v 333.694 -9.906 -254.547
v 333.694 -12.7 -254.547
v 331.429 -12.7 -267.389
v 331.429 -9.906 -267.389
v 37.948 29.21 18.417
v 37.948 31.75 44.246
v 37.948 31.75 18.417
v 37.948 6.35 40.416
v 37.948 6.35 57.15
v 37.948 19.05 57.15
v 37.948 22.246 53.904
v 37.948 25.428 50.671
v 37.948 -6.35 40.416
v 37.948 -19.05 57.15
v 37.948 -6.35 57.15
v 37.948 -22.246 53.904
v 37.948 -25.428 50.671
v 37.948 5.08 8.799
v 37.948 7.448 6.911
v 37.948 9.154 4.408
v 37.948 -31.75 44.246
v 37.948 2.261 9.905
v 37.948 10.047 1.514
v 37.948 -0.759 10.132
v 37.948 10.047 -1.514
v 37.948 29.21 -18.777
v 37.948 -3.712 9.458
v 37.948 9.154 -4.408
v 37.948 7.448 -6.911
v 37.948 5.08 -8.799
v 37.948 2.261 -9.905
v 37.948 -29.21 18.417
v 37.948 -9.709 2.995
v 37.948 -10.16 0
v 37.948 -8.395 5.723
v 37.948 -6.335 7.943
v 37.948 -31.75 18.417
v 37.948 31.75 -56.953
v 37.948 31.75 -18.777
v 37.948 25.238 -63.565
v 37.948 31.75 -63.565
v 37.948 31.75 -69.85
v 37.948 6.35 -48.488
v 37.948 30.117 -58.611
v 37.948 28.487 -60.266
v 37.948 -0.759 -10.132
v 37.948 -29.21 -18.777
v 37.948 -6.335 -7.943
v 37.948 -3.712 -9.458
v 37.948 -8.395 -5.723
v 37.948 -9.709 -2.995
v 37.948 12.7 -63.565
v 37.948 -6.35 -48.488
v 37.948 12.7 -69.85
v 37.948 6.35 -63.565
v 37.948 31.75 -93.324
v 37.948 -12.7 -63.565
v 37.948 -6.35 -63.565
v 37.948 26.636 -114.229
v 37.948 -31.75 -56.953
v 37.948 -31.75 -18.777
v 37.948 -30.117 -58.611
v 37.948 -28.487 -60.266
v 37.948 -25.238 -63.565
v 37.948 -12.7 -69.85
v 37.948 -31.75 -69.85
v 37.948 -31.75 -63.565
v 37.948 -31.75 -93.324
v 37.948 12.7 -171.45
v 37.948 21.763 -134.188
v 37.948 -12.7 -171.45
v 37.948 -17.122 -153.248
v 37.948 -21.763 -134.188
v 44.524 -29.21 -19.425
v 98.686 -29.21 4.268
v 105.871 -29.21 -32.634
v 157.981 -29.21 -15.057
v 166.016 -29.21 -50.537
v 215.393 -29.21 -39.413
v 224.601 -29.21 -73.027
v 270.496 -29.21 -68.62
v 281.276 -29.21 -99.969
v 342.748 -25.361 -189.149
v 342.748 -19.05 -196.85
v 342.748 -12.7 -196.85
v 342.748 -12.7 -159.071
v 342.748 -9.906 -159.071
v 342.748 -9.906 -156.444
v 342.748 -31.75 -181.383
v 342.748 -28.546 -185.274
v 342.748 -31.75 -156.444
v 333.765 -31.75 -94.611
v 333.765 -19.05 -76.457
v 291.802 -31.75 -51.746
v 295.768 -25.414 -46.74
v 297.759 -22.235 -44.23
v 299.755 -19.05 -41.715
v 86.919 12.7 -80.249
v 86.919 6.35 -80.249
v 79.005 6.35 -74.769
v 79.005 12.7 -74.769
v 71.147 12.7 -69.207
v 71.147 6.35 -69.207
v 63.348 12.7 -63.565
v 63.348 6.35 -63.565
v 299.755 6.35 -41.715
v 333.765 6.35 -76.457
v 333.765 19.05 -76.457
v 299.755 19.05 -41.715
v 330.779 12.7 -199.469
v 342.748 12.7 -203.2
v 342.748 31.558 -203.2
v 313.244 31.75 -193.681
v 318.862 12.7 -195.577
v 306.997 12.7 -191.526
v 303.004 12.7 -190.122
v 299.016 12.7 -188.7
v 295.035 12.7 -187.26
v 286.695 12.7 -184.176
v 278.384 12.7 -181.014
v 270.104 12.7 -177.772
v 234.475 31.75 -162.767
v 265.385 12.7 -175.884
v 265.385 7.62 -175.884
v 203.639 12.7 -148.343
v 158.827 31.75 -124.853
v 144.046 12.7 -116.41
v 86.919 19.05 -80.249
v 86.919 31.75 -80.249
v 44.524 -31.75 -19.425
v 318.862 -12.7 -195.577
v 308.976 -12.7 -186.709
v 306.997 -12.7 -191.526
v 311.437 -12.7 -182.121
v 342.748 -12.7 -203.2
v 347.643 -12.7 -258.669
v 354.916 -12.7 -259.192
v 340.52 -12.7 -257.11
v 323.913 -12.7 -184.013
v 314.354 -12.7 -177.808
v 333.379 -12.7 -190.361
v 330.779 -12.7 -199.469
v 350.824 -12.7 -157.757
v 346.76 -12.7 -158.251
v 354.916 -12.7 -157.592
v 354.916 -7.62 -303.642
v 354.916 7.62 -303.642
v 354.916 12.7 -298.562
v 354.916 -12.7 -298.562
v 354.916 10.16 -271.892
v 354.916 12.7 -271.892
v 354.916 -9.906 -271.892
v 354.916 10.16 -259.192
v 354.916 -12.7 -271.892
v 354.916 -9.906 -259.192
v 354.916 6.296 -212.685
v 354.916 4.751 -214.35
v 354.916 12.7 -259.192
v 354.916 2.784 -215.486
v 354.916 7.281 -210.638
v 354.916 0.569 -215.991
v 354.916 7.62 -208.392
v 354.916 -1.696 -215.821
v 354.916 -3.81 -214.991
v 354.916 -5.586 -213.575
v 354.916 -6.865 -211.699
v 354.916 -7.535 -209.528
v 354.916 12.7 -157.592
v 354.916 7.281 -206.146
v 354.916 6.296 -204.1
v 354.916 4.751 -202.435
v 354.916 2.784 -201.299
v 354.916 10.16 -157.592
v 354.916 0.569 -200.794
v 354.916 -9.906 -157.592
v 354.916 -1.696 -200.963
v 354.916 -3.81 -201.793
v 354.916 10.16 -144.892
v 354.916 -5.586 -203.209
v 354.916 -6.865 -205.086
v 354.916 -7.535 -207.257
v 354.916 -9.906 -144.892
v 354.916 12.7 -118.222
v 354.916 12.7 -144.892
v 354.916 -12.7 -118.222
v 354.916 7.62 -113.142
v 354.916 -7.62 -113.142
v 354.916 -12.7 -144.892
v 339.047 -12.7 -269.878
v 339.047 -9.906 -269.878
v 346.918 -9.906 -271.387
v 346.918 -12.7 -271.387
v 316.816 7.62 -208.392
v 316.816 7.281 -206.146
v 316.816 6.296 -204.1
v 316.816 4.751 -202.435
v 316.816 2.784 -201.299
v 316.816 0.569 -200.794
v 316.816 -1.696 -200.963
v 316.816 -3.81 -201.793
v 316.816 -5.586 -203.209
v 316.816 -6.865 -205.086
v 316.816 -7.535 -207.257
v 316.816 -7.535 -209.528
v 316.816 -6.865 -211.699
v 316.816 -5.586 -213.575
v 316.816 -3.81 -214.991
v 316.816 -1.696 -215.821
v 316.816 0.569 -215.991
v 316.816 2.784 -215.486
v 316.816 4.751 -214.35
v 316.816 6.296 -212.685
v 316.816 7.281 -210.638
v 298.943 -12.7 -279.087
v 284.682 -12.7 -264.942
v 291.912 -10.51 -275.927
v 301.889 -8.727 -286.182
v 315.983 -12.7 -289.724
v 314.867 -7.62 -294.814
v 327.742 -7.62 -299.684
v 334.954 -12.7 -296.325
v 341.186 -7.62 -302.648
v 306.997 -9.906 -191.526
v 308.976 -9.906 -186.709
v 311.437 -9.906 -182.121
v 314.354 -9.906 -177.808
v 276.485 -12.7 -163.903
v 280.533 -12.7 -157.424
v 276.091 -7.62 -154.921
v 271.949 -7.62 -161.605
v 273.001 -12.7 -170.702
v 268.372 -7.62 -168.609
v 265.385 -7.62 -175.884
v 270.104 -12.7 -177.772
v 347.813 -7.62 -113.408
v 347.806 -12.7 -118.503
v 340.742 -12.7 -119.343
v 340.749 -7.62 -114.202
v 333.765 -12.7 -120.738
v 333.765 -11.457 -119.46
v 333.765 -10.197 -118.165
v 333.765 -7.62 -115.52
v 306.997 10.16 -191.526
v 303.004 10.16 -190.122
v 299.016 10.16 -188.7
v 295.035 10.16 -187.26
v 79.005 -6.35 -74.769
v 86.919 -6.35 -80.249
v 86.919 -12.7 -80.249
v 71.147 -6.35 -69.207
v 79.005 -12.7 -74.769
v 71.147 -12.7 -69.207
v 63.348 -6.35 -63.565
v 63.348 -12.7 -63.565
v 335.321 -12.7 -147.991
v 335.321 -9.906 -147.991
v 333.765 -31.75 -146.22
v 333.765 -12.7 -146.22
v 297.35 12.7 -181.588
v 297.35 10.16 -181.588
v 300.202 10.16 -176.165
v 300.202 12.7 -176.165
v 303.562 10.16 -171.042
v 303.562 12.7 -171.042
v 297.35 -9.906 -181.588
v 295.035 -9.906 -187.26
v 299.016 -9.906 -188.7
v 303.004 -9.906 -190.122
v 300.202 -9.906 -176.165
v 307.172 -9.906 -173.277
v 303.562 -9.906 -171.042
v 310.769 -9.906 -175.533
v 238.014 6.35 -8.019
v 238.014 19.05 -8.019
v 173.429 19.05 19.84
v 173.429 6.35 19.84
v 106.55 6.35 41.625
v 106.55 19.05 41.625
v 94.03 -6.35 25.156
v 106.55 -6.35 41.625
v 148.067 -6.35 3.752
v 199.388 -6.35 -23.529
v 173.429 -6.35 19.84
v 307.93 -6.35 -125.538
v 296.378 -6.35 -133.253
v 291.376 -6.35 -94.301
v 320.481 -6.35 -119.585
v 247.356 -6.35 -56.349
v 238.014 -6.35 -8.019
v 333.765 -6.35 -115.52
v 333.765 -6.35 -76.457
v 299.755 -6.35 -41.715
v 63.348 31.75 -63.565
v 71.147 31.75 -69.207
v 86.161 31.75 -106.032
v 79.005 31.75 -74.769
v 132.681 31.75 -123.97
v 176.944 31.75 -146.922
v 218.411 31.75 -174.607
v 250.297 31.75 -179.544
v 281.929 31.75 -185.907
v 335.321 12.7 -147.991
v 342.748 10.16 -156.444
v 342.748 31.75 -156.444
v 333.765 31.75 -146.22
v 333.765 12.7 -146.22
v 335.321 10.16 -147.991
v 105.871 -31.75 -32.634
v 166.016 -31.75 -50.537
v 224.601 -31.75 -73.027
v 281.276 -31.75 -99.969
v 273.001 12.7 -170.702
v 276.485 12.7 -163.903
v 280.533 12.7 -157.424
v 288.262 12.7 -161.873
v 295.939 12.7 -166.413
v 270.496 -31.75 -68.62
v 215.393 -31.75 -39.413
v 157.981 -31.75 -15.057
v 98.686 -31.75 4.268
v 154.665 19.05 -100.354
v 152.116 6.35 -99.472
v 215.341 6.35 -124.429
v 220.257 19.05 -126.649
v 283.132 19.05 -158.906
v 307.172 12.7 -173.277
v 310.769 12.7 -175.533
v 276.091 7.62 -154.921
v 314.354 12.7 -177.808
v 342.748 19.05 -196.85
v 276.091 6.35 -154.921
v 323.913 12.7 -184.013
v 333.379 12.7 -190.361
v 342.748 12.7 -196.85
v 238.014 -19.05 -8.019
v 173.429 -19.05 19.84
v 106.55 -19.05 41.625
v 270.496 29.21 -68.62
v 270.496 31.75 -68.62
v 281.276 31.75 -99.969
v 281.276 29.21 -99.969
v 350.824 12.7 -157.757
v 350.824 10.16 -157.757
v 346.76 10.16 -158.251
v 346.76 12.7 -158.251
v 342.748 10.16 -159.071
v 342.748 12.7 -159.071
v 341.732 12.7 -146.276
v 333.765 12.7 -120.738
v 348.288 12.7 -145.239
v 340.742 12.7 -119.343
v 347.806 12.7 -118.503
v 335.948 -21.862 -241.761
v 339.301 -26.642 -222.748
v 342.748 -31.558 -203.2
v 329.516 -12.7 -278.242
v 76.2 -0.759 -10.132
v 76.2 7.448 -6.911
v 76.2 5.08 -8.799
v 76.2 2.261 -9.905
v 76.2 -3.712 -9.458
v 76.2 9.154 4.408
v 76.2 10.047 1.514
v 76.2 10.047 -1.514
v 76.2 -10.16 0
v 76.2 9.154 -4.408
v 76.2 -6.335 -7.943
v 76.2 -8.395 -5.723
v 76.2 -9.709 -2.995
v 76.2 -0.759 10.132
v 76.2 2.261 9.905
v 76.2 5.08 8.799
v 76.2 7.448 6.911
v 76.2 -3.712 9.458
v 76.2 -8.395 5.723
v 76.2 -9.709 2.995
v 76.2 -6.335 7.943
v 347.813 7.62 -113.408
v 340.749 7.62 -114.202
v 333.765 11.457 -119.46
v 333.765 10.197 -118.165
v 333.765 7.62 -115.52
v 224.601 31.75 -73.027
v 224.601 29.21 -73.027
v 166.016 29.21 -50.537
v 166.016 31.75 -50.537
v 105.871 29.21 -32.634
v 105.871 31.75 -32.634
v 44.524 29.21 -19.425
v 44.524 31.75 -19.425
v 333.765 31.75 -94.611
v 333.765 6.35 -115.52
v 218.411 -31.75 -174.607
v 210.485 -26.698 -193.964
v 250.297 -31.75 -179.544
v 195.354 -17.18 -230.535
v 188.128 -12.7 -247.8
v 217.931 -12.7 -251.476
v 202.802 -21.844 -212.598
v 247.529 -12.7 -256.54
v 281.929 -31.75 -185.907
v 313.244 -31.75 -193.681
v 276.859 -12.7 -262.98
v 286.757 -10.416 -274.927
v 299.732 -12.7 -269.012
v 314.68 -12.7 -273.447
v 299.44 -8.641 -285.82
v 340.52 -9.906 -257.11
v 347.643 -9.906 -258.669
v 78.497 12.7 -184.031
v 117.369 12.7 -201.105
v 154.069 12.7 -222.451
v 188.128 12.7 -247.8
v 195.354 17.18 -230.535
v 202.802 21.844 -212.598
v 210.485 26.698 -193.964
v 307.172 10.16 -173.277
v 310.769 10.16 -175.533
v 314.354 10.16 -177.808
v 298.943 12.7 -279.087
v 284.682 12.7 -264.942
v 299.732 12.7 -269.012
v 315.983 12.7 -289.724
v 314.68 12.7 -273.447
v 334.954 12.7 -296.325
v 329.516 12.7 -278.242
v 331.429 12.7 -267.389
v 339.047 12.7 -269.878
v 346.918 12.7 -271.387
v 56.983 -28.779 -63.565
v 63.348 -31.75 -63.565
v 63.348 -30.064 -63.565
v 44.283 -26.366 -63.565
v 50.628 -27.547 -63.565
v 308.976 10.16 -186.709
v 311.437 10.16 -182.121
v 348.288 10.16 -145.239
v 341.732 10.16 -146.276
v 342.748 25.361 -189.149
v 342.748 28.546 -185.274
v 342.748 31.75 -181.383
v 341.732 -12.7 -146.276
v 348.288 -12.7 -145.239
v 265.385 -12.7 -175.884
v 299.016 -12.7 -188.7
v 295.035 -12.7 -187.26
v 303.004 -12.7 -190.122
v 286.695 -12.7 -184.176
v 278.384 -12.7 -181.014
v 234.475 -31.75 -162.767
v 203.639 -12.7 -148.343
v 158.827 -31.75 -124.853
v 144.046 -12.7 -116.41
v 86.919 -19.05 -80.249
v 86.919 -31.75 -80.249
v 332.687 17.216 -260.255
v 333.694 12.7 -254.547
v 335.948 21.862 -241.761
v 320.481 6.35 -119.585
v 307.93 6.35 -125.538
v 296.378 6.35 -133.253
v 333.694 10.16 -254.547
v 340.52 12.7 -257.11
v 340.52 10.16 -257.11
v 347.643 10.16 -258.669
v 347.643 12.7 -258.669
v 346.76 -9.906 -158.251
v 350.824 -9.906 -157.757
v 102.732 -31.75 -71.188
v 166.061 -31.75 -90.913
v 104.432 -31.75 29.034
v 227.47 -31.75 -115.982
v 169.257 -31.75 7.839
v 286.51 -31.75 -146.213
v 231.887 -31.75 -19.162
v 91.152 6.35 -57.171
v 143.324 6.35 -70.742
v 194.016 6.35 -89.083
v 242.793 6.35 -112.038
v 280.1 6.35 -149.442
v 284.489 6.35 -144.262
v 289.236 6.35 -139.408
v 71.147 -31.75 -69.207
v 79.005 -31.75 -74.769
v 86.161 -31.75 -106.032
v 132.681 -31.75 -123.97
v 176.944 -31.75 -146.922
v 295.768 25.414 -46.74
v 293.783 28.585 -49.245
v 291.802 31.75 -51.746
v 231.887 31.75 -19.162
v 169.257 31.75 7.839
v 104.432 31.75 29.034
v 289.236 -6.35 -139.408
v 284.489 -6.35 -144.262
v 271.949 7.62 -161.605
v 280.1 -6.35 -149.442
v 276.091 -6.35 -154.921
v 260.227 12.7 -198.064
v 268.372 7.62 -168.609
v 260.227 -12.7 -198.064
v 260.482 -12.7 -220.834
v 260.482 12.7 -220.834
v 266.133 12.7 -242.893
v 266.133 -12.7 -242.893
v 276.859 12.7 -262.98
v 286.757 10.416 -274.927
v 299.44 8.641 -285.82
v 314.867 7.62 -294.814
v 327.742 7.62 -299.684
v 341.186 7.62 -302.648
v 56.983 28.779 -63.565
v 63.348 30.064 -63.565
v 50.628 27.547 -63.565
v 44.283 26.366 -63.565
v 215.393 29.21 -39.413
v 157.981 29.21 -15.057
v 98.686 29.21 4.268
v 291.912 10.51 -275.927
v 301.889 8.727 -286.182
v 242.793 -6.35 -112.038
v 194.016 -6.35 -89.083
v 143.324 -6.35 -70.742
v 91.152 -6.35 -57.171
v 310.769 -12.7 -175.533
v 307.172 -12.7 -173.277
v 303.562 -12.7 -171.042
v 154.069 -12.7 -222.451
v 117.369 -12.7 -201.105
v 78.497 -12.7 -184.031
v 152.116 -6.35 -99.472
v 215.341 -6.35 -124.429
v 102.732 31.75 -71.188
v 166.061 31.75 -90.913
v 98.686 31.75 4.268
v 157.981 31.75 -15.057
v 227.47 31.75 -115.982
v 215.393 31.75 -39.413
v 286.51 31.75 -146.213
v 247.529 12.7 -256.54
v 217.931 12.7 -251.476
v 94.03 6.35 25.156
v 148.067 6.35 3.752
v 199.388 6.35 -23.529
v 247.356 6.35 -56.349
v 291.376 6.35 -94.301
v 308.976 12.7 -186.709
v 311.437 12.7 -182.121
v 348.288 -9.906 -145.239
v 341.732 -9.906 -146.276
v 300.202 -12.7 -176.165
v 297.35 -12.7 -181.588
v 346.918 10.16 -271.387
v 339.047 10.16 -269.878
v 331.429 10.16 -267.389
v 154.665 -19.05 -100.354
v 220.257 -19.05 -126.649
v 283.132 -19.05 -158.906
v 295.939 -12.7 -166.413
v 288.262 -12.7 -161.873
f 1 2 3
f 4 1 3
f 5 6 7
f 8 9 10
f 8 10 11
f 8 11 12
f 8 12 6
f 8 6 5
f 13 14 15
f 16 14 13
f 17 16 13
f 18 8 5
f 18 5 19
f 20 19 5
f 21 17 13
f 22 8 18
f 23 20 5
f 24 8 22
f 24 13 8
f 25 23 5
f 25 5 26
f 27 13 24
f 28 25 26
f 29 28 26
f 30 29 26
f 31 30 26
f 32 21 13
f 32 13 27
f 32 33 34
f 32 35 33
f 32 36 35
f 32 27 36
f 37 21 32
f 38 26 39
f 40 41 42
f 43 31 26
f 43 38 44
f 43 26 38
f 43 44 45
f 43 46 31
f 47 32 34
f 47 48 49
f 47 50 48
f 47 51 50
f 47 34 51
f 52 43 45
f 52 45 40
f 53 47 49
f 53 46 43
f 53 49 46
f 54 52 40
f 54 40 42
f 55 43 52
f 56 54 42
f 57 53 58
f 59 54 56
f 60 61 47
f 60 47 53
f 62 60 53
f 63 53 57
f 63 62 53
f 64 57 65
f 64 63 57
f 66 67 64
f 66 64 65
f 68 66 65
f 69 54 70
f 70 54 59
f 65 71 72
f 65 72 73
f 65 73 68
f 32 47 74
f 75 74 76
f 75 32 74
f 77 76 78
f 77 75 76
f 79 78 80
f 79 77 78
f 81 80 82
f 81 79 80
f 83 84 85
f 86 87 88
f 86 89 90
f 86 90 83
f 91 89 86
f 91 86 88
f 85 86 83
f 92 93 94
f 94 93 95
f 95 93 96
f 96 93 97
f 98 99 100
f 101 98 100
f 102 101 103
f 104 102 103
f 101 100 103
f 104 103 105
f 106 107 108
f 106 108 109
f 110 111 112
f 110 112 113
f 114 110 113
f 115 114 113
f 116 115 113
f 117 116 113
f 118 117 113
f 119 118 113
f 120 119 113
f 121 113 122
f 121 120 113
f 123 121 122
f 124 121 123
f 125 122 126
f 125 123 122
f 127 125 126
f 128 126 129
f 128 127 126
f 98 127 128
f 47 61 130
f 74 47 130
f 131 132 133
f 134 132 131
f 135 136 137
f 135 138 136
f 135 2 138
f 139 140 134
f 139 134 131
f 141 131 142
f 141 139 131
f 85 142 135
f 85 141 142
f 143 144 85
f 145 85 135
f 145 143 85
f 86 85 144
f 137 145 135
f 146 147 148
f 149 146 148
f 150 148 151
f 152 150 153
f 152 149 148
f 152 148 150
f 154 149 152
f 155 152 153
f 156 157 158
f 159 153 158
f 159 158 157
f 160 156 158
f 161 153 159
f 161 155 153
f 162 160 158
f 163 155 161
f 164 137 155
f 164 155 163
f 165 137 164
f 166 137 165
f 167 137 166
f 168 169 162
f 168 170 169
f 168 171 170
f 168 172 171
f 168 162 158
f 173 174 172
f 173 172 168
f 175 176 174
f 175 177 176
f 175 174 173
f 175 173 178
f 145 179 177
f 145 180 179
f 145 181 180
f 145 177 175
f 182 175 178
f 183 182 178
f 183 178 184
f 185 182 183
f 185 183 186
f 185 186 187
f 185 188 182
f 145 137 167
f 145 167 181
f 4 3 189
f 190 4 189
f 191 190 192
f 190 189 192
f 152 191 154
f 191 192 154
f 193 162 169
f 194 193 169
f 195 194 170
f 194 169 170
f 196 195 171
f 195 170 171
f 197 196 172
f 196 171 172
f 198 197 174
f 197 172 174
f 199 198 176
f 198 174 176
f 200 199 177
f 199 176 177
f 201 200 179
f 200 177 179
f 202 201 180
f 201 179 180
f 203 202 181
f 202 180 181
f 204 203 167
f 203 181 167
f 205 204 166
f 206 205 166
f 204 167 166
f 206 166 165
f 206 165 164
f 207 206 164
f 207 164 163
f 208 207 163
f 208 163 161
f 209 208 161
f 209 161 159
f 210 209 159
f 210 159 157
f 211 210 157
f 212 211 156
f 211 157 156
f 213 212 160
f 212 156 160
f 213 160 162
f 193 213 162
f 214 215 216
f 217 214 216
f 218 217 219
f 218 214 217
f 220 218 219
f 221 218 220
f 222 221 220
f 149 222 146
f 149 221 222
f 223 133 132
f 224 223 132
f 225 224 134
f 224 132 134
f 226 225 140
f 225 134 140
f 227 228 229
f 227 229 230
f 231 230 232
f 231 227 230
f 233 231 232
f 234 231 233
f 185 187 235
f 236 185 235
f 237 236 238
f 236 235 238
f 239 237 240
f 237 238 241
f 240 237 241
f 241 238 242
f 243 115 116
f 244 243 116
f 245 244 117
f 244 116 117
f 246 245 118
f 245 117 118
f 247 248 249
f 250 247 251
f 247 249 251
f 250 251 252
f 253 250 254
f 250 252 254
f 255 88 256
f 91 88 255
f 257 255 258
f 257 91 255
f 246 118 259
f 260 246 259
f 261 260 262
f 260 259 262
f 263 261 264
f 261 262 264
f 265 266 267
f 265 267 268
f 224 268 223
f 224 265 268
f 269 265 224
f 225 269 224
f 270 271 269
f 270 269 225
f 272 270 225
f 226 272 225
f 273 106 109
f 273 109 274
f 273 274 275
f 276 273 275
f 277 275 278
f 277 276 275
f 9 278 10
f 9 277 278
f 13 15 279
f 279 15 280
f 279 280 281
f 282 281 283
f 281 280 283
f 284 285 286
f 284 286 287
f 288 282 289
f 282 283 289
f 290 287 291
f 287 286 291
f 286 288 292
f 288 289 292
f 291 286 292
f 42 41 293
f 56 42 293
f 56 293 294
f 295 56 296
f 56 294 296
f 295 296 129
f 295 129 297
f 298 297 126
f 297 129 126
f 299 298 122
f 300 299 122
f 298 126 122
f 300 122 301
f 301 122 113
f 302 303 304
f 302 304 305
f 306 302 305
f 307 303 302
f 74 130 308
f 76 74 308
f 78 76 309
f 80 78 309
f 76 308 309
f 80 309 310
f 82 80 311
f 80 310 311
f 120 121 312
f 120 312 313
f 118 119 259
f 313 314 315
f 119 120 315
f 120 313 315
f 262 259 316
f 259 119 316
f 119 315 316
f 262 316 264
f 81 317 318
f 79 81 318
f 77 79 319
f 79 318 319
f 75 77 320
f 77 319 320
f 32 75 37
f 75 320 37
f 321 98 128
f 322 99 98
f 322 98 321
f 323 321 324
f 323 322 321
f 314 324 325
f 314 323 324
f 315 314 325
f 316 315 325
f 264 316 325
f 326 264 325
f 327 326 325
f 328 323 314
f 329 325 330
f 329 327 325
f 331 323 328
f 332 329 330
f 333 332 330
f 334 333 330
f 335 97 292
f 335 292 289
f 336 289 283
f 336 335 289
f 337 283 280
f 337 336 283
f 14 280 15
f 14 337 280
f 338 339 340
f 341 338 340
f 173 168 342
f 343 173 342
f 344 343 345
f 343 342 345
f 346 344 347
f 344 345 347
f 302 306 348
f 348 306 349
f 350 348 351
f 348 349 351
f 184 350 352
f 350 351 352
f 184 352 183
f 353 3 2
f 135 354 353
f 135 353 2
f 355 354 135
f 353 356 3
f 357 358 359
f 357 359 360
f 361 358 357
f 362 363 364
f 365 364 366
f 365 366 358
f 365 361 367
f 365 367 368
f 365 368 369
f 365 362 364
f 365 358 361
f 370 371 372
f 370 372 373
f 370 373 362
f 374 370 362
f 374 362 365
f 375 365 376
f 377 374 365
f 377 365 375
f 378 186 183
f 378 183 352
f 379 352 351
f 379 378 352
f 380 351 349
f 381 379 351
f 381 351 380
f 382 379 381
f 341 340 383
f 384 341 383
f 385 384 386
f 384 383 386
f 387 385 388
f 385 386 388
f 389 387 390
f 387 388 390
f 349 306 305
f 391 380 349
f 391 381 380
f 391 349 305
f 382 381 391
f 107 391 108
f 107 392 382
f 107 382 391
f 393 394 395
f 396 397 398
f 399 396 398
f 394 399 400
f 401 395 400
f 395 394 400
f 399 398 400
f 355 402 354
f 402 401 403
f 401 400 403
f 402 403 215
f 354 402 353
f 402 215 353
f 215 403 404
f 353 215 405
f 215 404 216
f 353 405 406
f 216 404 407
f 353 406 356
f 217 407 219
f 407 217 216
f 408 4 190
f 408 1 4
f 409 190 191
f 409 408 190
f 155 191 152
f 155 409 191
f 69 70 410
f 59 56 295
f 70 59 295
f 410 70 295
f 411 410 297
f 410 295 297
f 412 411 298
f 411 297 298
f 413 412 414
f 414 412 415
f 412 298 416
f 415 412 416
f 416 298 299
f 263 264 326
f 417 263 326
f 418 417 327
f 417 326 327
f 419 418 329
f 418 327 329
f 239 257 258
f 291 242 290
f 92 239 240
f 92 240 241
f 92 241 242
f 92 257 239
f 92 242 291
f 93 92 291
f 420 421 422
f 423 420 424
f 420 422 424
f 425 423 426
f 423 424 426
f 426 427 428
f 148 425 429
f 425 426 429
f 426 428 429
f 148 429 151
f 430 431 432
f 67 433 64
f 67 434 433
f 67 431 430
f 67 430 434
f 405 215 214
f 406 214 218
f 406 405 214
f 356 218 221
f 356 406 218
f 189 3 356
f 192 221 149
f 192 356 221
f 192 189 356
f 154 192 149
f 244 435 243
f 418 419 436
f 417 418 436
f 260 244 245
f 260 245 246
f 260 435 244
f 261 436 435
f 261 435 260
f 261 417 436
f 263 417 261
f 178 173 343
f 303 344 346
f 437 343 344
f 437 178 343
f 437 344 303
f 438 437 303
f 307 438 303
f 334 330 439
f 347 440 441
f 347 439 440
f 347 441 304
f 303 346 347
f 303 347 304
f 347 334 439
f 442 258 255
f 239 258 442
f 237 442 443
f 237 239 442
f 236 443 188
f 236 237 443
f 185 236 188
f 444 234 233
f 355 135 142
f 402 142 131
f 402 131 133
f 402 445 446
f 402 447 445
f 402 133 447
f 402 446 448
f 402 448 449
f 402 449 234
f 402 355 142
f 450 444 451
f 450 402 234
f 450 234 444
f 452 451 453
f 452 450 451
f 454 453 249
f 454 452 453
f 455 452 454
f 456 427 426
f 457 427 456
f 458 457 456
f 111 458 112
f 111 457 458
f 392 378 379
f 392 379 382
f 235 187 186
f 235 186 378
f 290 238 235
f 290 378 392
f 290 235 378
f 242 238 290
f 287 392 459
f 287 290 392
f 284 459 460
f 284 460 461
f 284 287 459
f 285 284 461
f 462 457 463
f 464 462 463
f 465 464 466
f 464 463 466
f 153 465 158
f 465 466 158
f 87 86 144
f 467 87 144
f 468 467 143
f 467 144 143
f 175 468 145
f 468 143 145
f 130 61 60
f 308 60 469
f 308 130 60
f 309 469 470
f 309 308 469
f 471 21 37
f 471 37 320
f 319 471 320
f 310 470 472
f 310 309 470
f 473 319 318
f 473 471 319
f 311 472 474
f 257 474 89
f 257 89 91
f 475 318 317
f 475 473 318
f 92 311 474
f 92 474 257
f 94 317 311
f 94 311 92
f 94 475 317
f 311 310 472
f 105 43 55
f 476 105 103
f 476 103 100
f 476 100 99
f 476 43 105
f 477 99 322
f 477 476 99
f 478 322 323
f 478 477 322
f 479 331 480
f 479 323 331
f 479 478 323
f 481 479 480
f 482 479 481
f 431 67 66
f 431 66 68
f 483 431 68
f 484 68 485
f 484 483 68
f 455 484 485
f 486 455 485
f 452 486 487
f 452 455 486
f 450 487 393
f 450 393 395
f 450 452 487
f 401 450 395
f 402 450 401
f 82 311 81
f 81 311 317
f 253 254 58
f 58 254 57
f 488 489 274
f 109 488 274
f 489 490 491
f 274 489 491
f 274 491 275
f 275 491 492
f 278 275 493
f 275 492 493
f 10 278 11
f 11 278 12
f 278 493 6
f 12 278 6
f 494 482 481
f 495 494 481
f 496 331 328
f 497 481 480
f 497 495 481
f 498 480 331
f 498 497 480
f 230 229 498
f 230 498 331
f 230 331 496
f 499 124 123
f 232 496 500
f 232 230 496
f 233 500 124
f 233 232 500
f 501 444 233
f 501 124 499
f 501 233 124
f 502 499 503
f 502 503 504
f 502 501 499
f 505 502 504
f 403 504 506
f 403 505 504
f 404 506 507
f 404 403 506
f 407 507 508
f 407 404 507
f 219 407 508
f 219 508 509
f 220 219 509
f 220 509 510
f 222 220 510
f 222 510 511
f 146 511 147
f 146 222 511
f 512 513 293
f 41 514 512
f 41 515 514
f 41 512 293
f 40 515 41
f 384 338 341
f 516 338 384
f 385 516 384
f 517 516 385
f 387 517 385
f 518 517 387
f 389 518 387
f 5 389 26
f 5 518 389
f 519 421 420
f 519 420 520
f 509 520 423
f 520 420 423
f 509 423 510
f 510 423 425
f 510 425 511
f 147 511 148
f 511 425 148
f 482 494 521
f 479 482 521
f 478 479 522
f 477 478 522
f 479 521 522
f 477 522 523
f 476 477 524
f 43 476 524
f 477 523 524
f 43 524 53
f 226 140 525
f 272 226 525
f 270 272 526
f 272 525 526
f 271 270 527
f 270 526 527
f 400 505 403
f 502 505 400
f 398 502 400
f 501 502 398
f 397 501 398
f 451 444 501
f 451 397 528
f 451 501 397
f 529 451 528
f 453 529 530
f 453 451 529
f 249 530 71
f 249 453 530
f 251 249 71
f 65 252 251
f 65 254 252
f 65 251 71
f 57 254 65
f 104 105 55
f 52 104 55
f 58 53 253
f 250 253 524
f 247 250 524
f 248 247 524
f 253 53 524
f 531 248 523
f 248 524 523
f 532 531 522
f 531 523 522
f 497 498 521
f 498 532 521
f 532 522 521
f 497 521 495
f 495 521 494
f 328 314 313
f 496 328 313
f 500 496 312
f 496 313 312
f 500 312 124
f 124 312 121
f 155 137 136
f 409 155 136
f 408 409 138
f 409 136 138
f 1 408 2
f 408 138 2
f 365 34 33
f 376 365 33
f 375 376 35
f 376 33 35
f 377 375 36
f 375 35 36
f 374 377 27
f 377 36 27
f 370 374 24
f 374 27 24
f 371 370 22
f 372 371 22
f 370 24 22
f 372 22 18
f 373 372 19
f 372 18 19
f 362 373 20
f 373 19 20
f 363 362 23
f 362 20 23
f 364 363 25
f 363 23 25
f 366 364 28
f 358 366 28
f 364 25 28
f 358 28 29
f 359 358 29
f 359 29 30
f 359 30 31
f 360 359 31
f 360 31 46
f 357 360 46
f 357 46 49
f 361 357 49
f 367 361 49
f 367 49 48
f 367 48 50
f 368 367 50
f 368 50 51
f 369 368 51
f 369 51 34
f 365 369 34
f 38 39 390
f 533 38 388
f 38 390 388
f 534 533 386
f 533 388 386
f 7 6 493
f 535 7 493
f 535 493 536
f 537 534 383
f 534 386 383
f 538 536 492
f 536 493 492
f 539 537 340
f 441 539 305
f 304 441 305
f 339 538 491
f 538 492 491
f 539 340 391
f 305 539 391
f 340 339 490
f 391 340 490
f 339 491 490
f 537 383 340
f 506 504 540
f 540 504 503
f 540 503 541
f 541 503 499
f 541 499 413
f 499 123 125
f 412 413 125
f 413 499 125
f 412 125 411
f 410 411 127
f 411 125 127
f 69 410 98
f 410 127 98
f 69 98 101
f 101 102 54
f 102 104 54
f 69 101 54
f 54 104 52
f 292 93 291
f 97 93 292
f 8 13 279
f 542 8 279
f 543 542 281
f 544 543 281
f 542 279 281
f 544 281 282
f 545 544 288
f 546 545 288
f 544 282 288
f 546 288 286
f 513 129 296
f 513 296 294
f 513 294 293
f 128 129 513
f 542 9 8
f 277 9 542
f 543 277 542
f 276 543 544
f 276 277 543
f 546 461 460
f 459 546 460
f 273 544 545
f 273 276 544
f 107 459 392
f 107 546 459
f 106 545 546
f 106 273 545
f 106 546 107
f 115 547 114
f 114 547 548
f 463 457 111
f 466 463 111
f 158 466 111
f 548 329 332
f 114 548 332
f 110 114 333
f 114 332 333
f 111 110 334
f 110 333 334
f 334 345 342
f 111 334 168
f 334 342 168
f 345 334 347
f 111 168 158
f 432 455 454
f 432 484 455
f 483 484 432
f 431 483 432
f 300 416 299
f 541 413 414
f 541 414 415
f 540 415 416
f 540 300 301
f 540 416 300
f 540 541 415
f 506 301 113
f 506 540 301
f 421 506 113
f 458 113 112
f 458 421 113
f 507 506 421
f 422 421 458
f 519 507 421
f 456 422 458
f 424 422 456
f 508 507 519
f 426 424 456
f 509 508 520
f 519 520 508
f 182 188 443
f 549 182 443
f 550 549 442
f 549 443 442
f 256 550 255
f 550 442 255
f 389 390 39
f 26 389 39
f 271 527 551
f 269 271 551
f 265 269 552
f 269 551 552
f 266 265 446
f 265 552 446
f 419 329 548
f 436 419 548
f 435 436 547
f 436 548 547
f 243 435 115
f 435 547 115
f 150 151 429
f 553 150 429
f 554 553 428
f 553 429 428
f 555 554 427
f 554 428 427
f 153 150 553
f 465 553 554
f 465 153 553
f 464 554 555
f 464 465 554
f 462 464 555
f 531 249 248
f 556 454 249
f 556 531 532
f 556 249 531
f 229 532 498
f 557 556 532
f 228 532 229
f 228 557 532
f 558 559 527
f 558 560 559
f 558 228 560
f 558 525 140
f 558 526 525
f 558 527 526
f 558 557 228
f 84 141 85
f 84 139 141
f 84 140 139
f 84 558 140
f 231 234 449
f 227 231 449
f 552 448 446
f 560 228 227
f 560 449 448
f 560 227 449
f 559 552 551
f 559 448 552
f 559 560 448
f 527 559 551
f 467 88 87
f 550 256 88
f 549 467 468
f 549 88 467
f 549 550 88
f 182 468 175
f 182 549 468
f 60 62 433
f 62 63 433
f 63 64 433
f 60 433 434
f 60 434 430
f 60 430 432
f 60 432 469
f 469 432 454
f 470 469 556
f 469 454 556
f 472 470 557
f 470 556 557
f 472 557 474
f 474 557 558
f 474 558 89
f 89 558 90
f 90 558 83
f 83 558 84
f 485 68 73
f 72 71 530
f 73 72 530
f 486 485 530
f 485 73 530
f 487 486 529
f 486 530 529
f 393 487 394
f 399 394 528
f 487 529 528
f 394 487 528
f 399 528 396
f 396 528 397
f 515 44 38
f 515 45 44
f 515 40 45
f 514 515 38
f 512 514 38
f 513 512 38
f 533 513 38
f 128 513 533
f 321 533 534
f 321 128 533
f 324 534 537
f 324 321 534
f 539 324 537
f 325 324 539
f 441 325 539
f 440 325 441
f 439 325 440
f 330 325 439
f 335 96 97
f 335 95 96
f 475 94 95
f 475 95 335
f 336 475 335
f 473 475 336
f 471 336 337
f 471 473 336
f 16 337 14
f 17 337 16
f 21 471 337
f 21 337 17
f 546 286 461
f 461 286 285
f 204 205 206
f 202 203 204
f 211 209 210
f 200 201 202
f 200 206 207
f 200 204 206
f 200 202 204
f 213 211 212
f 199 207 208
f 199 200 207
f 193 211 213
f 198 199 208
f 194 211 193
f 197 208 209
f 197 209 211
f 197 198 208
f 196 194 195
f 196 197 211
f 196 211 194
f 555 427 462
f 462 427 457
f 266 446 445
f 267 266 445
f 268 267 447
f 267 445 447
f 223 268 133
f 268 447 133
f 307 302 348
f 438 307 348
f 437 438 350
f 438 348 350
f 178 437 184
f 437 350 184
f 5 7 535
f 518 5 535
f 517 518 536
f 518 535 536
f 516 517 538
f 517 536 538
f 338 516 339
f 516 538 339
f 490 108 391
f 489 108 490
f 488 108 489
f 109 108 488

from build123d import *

# Parameters (mm, degrees)
F3_DEPTH     = 31.75
F5_DEPTH     = 6.35
F6_SIZE      = 12.7
F7_SIZE      = 12.7
F9_DEPTH     = 31.75
F11_DEPTH    = 12.7
F13_T2_ANGLE = 48.1784563201
F13_T4_ANGLE = 86.2150976381
F13_T6_ANGLE = 86.2150976381
F13_T8_ANGLE = 48.1784563201
F15_DEPTH    = 12.7
F16_SIZE     = 5.08
F18_DEPTH    = 2.54
F20_DEPTH    = 2.54
F21_R        = 7.62
F22_DEPTH    = 38.1
F24_DEPTH    = 2.794
F26_DEPTH    = 2.54
F27_R        = 10.16
F27_R_2      = 9.525
F28_DEPTH    = 76.2


# Not quite as in the source:
# - a fillet or chamfer that OpenCascade refuses, or shapes differently, is made with other operations: its cross-section is extruded or revolved along the edge and cut away or added
# - a feature of the source that left no trace in its solid (it failed there, or was rolled back) is left out
# - a feature names something its author has since deleted; it is built from what else it names


with BuildPart() as f3:
    # F2 (on Front) → F3 (new body, symmetric)
    with BuildSketch(Plane.XZ):
        with BuildLine():
            Line((37.9477068782, 57.15), (37.9477068782, -69.85))
            ThreePointArc((37.9477068782, -69.85), (197.3095607255, -116.6415507663), (342.7477068782, -196.85))
            Line((342.7477068782, -196.85), (342.7477068782, -156.4439684153))
            Line((342.7477068782, -156.4439684153), (333.764821291, -146.2200134993))
            Line((333.764821291, -146.2200134993), (333.764821291, -76.4565169811))
            Line((333.764821291, -76.4565169811), (299.7545793033, -41.7148783095))
            ThreePointArc((299.7545793033, -41.7148783095), (173.42869903, 19.8395158234), (37.9477068782, 57.15))
        make_face()
    extrude(amount=F3_DEPTH, both=True)

    # F4 (on Front) → F5 (cut, symmetric)
    with BuildSketch(Plane.XZ):
        with BuildLine():
            Line((37.9477068782, -48.4879799187), (37.9477068782, -69.85))
            ThreePointArc((37.9477068782, -69.85), (197.3095607255, -116.6415507663), (342.7477068782, -196.85))
            Line((342.7477068782, -196.85), (342.7477068782, -156.4439684153))
            Line((342.7477068782, -156.4439684153), (333.764821291, -146.2200134993))
            Line((333.764821291, -146.2200134993), (333.764821291, -76.4565169811))
            Line((333.764821291, -76.4565169811), (299.7545793033, -41.7148783095))
            ThreePointArc((299.7545793033, -41.7148783095), (173.42869903, 19.8395158234), (37.9477068782, 57.15))
            Line((37.9477068782, 57.15), (37.9477068782, 40.4159426689))
            ThreePointArc((37.9477068782, 40.4159426689), (174.1077804995, -9.1728518585), (291.3761138916, -94.3007096648))
            Line((291.3761138916, -94.3007096648), (297.9114055634, -145.1900005341))
            ThreePointArc((297.9114055634, -145.1900005341), (173.776538026, -81.1205697987), (37.9477068782, -48.4879799187))
        make_face()
    extrude(amount=F5_DEPTH, both=True, mode=Mode.SUBTRACT)

    # F6
    f6_edges = [f3.edges().sort_by_distance(p)[0] for p in [
        (173.428699, -31.75, 19.839516),
        (316.7597, -31.75, -59.085698),
        (316.7597, 31.75, -59.085698),
        (173.428699, 31.75, 19.839516),
    ]]
    chamfer(f6_edges, length=F6_SIZE)

    # F7
    f7_edges = [f3.edges().sort_by_distance(p)[0] for p in [
        (197.309561, -31.75, -116.641551),
        (197.309561, 31.75, -116.641551),
    ]]
    chamfer(f7_edges, length=F7_SIZE)

    # F8 (on Front) → F9 (join, symmetric)
    with BuildSketch(Plane.XZ):
        with BuildLine():
            ThreePointArc((86.9189181185, -80.2493599938), (62.5187399917, -74.647396796), (37.9477068782, -69.85))
            Line((37.9477068782, -69.85), (37.9477068782, -171.45))
            ThreePointArc((37.9477068782, -171.45), (117.3693749826, -201.1045334968), (188.127681613, -247.7998733521))
            ThreePointArc((188.127681613, -247.7998733521), (259.6802456544, -259.033648506), (329.51571574, -278.2423507795))
            Line((329.51571574, -278.2423507795), (342.7477068782, -203.2))
            ThreePointArc((342.7477068782, -203.2), (210.1366349445, -151.4972629597), (86.9189181185, -80.2493599938))
        make_face()
        with BuildLine():
            add(Edge.make_bspline(
                [(37.9477068782, -69.85), (37.9477068782, -67.7549506267), (37.9477068782, -65.6599012534), (37.9477068782, -63.5648518801)],
                knots=[0, 0, 0, 0, 0.4873412151, 0.4873412151, 0.4873412151, 0.4873412151], degree=3))
            ThreePointArc((37.9477068782, -69.85), (62.5187399917, -74.647396796), (86.9189181185, -80.2493599938))
            ThreePointArc((86.9189181185, -80.2493599938), (75.0688400161, -71.9981901024), (63.3477068782, -63.5648518801))
            Line((63.3477068782, -63.5648518801), (37.9477068782, -63.5648518801))
        make_face()
    extrude(amount=F9_DEPTH, both=True)

    # F10 (on Front) → F11 (cut, symmetric)
    with BuildSketch(Plane.XZ):
        with BuildLine():
            add(Edge.make_bspline(
                [(37.9477068782, -69.85), (37.9477068782, -67.7549506267), (37.9477068782, -65.6599012534), (37.9477068782, -63.5648518801)],
                knots=[0, 0, 0, 0, 0.4873412151, 0.4873412151, 0.4873412151, 0.4873412151], degree=3))
            Line((37.9477068782, -69.85), (37.9477068782, -171.45))
            ThreePointArc((37.9477068782, -171.45), (117.3693749826, -201.1045334968), (188.127681613, -247.7998733521))
            ThreePointArc((188.127681613, -247.7998733521), (259.6802456544, -259.033648506), (329.51571574, -278.2423507795))
            Line((329.51571574, -278.2423507795), (342.7477068782, -203.2))
            ThreePointArc((342.7477068782, -203.2), (197.1706361591, -145.1420264492), (63.3477068782, -63.5648518801))
            Line((63.3477068782, -63.5648518801), (37.9477068782, -63.5648518801))
        make_face()
    extrude(amount=F11_DEPTH, both=True, mode=Mode.SUBTRACT)

    # F13: chamfer of 76.2 x 19.05 on 4 edges, made by hand

    # F13_s1 → F13_t2 (revolve, cut)
    with BuildSketch(Plane(origin=(-60.6535291513, 0, -12.8240400006), x_dir=(0, 1, 0), z_dir=(-0.9783709739, 0, -0.2068580127))):
        Polygon((31.75, 174.9435450059), (12.7, 251.1435450059), (31.75, 251.1435450059), align=None)
    revolve(axis=Axis((124.3217755456, 31.75, -887.6969377111), (0, 1, 0)), revolution_arc=F13_T2_ANGLE, mode=Mode.SUBTRACT)

    # F13_s3 → F13_t4 (revolve, cut)
    with BuildSketch(Plane(origin=(-192.2531449662, 0, -55.7064857223), x_dir=(0, 1, 0), z_dir=(-0.9604918286, 0, -0.2783081876))):
        Polygon((12.7, 124.3402407106), (31.75, 48.1402407106), (31.75, 124.3402407106), align=None)
    revolve(axis=Axis((-53.0135938756, 31.75, -536.2473285656), (0, 1, 0)), revolution_arc=F13_T4_ANGLE, mode=Mode.SUBTRACT)

    # F13_s5 → F13_t6 (revolve, cut)
    with BuildSketch(Plane(origin=(-192.2531449662, 0, -55.7064857223), x_dir=(0, 1, 0), z_dir=(-0.9604918286, 0, -0.2783081876))):
        Polygon((-31.75, 48.1402407106), (-12.7, 124.3402407106), (-31.75, 124.3402407106), align=None)
    revolve(axis=Axis((-53.0135938756, -31.75, -536.2473285656), (0, 1, 0)), revolution_arc=F13_T6_ANGLE, mode=Mode.SUBTRACT)

    # F13_s7 → F13_t8 (revolve, cut)
    with BuildSketch(Plane(origin=(-60.6535291513, 0, -12.8240400006), x_dir=(0, 1, 0), z_dir=(-0.9783709739, 0, -0.2068580127))):
        Polygon((-31.75, 174.9435450059), (-12.7, 251.1435450059), (-31.75, 251.1435450059), align=None)
    revolve(axis=Axis((124.3217755456, -31.75, -887.6969377111), (0, 1, 0)), revolution_arc=F13_T8_ANGLE, mode=Mode.SUBTRACT)

    # F14 (on Front) → F15 (join, symmetric)
    with BuildSketch(Plane.XZ):
        with BuildLine():
            Line((354.91571574, -208.3923507795), (354.91571574, -113.1423507795))
            ThreePointArc((354.91571574, -113.1423507795), (259.66571574, -208.3923507795), (354.91571574, -303.6423507795))
            Line((354.91571574, -303.6423507795), (354.91571574, -208.3923507795))
        make_face()
    extrude(amount=F15_DEPTH, both=True)

    # F16
    f16_edges = [f3.edges().sort_by_distance(p)[0] for p in [
        (310.909323, -12.7, -292.867199),
        (270.087911, -12.7, -165.070232),
        (344.273637, -12.7, -113.738726),
        (344.273637, 12.7, -113.738726),
        (270.087911, 12.7, -165.070232),
        (310.909323, 12.7, -292.867199),
    ]]
    chamfer(f16_edges, length=F16_SIZE)

    # F17 (on face) → F18 (cut)
    with BuildSketch(Plane.XZ.offset(31.75)):
        with BuildLine():
            Line((37.9477068782, 18.4170784308), (37.9477068782, -18.7770907031))
            Line((37.9477068782, -18.7770907031), (44.5238578239, -19.4250085564))
            ThreePointArc((44.5238578239, -19.4250085564), (166.0160786587, -50.5371993601), (281.275870441, -99.9690568843))
            Line((281.275870441, -99.9690568843), (270.4956403873, -68.620350335))
            ThreePointArc((270.4956403873, -68.620350335), (157.9813255542, -15.0565404403), (37.9477068782, 18.4170784308))
        make_face()
    extrude(amount=-F18_DEPTH, mode=Mode.SUBTRACT)

    # F19 (on face) → F20 (cut)
    with BuildSketch(Plane(origin=(0, 31.75, 0), x_dir=(-1, 0, 0), z_dir=(0, 1, 0))):
        with BuildLine():
            ThreePointArc((-37.9477068782, 18.4170784308), (-157.9813255542, -15.0565404403), (-270.4956403873, -68.620350335))
            Line((-270.4956403873, -68.620350335), (-281.275870441, -99.9690568843))
            ThreePointArc((-281.275870441, -99.9690568843), (-166.0160786587, -50.5371993601), (-44.5238578239, -19.4250085564))
            Line((-44.5238578239, -19.4250085564), (-37.9477068782, -18.7770907031))
            Line((-37.9477068782, -18.7770907031), (-37.9477068782, 18.4170784308))
        make_face()
    extrude(amount=-F20_DEPTH, mode=Mode.SUBTRACT)

    # F21 (on face) → F22 (cut)
    with BuildSketch(Plane.YZ.offset(354.91571574)):
        with Locations((0, -208.3923507795)):
            Circle(F21_R)
    extrude(amount=-F22_DEPTH, mode=Mode.SUBTRACT)

    # F23 (on face) → F24 (cut)
    with BuildSketch(Plane.XZ.offset(12.7)):
        with BuildLine():
            ThreePointArc((331.4293971954, -267.3893239326), (342.9586633277, -270.7564341738), (354.91571574, -271.8923507795))
            Line((354.91571574, -271.8923507795), (354.91571574, -259.1923507795))
            ThreePointArc((354.91571574, -259.1923507795), (344.0535486893, -258.0174787588), (333.6938090461, -254.5472061718))
            Line((333.6938090461, -254.5472061718), (331.4293971954, -267.3893239326))
        make_face()
        with BuildLine():
            ThreePointArc((342.7477068782, -159.0711630369), (348.7869449547, -157.9634090034), (354.91571574, -157.5923507795))
            Line((354.91571574, -157.5923507795), (354.91571574, -144.8923507795))
            ThreePointArc((354.91571574, -144.8923507795), (344.9966028413, -145.6718501493), (335.3210156829, -147.991210644))
            Line((335.3210156829, -147.991210644), (342.7477068782, -156.4439684153))
            Line((342.7477068782, -156.4439684153), (342.7477068782, -159.0711630369))
        make_face()
        with BuildLine():
            ThreePointArc((303.5618689691, -171.0422179573), (298.710555552, -178.8418860075), (295.0352686554, -187.2598625929))
            ThreePointArc((295.0352686554, -187.2598625929), (301.0091143651, -189.413157651), (306.9974582895, -191.5257979926))
            ThreePointArc((306.9974582895, -191.5257979926), (310.1473048853, -184.3834068306), (314.3542442481, -177.8079261419))
            ThreePointArc((314.3542442481, -177.8079261419), (308.9721939736, -174.4025207151), (303.5618689691, -171.0422179573))
        make_face()
    extrude(amount=-F24_DEPTH, mode=Mode.SUBTRACT)

    # F25 (on face) → F26 (cut)
    with BuildSketch(Plane(origin=(0, 12.7, 0), x_dir=(-1, 0, 0), z_dir=(0, 1, 0))):
        with BuildLine():
            Line((-354.91571574, -259.1923507795), (-354.91571574, -271.8923507795))
            ThreePointArc((-354.91571574, -271.8923507795), (-342.9586633277, -270.7564341738), (-331.4293971954, -267.3893239326))
            Line((-331.4293971954, -267.3893239326), (-333.6938090461, -254.5472061718))
            ThreePointArc((-333.6938090461, -254.5472061718), (-344.0535486893, -258.0174787588), (-354.91571574, -259.1923507795))
        make_face()
        with BuildLine():
            ThreePointArc((-335.3210156829, -147.991210644), (-344.9966028413, -145.6718501493), (-354.91571574, -144.8923507795))
            Line((-354.91571574, -144.8923507795), (-354.91571574, -157.5923507795))
            ThreePointArc((-354.91571574, -157.5923507795), (-348.7869449547, -157.9634090034), (-342.7477068782, -159.0711630369))
            Line((-342.7477068782, -159.0711630369), (-342.7477068782, -156.4439684153))
            Line((-342.7477068782, -156.4439684153), (-335.3210156829, -147.991210644))
        make_face()
        with BuildLine():
            ThreePointArc((-295.0352686554, -187.2598625929), (-298.710555552, -178.8418860075), (-303.5618689691, -171.0422179573))
            ThreePointArc((-303.5618689691, -171.0422179573), (-308.9721939736, -174.4025207151), (-314.3542442481, -177.8079261419))
            ThreePointArc((-314.3542442481, -177.8079261419), (-310.1473048853, -184.3834068306), (-306.9974582895, -191.5257979926))
            ThreePointArc((-306.9974582895, -191.5257979926), (-301.0091143651, -189.413157651), (-295.0352686554, -187.2598625929))
        make_face()
    extrude(amount=-F26_DEPTH, mode=Mode.SUBTRACT)

    # F27 (on face) → F28 (cut)
    with BuildSketch(Plane(origin=(0, 0, 0), x_dir=(0, -1, 0), z_dir=(-1, 0, 0))):
        Circle(F27_R)
        Circle(F27_R_2, mode=Mode.SUBTRACT)
        Circle(F27_R_2)
    extrude(amount=-F28_DEPTH, mode=Mode.SUBTRACT)


solid = f3.part
